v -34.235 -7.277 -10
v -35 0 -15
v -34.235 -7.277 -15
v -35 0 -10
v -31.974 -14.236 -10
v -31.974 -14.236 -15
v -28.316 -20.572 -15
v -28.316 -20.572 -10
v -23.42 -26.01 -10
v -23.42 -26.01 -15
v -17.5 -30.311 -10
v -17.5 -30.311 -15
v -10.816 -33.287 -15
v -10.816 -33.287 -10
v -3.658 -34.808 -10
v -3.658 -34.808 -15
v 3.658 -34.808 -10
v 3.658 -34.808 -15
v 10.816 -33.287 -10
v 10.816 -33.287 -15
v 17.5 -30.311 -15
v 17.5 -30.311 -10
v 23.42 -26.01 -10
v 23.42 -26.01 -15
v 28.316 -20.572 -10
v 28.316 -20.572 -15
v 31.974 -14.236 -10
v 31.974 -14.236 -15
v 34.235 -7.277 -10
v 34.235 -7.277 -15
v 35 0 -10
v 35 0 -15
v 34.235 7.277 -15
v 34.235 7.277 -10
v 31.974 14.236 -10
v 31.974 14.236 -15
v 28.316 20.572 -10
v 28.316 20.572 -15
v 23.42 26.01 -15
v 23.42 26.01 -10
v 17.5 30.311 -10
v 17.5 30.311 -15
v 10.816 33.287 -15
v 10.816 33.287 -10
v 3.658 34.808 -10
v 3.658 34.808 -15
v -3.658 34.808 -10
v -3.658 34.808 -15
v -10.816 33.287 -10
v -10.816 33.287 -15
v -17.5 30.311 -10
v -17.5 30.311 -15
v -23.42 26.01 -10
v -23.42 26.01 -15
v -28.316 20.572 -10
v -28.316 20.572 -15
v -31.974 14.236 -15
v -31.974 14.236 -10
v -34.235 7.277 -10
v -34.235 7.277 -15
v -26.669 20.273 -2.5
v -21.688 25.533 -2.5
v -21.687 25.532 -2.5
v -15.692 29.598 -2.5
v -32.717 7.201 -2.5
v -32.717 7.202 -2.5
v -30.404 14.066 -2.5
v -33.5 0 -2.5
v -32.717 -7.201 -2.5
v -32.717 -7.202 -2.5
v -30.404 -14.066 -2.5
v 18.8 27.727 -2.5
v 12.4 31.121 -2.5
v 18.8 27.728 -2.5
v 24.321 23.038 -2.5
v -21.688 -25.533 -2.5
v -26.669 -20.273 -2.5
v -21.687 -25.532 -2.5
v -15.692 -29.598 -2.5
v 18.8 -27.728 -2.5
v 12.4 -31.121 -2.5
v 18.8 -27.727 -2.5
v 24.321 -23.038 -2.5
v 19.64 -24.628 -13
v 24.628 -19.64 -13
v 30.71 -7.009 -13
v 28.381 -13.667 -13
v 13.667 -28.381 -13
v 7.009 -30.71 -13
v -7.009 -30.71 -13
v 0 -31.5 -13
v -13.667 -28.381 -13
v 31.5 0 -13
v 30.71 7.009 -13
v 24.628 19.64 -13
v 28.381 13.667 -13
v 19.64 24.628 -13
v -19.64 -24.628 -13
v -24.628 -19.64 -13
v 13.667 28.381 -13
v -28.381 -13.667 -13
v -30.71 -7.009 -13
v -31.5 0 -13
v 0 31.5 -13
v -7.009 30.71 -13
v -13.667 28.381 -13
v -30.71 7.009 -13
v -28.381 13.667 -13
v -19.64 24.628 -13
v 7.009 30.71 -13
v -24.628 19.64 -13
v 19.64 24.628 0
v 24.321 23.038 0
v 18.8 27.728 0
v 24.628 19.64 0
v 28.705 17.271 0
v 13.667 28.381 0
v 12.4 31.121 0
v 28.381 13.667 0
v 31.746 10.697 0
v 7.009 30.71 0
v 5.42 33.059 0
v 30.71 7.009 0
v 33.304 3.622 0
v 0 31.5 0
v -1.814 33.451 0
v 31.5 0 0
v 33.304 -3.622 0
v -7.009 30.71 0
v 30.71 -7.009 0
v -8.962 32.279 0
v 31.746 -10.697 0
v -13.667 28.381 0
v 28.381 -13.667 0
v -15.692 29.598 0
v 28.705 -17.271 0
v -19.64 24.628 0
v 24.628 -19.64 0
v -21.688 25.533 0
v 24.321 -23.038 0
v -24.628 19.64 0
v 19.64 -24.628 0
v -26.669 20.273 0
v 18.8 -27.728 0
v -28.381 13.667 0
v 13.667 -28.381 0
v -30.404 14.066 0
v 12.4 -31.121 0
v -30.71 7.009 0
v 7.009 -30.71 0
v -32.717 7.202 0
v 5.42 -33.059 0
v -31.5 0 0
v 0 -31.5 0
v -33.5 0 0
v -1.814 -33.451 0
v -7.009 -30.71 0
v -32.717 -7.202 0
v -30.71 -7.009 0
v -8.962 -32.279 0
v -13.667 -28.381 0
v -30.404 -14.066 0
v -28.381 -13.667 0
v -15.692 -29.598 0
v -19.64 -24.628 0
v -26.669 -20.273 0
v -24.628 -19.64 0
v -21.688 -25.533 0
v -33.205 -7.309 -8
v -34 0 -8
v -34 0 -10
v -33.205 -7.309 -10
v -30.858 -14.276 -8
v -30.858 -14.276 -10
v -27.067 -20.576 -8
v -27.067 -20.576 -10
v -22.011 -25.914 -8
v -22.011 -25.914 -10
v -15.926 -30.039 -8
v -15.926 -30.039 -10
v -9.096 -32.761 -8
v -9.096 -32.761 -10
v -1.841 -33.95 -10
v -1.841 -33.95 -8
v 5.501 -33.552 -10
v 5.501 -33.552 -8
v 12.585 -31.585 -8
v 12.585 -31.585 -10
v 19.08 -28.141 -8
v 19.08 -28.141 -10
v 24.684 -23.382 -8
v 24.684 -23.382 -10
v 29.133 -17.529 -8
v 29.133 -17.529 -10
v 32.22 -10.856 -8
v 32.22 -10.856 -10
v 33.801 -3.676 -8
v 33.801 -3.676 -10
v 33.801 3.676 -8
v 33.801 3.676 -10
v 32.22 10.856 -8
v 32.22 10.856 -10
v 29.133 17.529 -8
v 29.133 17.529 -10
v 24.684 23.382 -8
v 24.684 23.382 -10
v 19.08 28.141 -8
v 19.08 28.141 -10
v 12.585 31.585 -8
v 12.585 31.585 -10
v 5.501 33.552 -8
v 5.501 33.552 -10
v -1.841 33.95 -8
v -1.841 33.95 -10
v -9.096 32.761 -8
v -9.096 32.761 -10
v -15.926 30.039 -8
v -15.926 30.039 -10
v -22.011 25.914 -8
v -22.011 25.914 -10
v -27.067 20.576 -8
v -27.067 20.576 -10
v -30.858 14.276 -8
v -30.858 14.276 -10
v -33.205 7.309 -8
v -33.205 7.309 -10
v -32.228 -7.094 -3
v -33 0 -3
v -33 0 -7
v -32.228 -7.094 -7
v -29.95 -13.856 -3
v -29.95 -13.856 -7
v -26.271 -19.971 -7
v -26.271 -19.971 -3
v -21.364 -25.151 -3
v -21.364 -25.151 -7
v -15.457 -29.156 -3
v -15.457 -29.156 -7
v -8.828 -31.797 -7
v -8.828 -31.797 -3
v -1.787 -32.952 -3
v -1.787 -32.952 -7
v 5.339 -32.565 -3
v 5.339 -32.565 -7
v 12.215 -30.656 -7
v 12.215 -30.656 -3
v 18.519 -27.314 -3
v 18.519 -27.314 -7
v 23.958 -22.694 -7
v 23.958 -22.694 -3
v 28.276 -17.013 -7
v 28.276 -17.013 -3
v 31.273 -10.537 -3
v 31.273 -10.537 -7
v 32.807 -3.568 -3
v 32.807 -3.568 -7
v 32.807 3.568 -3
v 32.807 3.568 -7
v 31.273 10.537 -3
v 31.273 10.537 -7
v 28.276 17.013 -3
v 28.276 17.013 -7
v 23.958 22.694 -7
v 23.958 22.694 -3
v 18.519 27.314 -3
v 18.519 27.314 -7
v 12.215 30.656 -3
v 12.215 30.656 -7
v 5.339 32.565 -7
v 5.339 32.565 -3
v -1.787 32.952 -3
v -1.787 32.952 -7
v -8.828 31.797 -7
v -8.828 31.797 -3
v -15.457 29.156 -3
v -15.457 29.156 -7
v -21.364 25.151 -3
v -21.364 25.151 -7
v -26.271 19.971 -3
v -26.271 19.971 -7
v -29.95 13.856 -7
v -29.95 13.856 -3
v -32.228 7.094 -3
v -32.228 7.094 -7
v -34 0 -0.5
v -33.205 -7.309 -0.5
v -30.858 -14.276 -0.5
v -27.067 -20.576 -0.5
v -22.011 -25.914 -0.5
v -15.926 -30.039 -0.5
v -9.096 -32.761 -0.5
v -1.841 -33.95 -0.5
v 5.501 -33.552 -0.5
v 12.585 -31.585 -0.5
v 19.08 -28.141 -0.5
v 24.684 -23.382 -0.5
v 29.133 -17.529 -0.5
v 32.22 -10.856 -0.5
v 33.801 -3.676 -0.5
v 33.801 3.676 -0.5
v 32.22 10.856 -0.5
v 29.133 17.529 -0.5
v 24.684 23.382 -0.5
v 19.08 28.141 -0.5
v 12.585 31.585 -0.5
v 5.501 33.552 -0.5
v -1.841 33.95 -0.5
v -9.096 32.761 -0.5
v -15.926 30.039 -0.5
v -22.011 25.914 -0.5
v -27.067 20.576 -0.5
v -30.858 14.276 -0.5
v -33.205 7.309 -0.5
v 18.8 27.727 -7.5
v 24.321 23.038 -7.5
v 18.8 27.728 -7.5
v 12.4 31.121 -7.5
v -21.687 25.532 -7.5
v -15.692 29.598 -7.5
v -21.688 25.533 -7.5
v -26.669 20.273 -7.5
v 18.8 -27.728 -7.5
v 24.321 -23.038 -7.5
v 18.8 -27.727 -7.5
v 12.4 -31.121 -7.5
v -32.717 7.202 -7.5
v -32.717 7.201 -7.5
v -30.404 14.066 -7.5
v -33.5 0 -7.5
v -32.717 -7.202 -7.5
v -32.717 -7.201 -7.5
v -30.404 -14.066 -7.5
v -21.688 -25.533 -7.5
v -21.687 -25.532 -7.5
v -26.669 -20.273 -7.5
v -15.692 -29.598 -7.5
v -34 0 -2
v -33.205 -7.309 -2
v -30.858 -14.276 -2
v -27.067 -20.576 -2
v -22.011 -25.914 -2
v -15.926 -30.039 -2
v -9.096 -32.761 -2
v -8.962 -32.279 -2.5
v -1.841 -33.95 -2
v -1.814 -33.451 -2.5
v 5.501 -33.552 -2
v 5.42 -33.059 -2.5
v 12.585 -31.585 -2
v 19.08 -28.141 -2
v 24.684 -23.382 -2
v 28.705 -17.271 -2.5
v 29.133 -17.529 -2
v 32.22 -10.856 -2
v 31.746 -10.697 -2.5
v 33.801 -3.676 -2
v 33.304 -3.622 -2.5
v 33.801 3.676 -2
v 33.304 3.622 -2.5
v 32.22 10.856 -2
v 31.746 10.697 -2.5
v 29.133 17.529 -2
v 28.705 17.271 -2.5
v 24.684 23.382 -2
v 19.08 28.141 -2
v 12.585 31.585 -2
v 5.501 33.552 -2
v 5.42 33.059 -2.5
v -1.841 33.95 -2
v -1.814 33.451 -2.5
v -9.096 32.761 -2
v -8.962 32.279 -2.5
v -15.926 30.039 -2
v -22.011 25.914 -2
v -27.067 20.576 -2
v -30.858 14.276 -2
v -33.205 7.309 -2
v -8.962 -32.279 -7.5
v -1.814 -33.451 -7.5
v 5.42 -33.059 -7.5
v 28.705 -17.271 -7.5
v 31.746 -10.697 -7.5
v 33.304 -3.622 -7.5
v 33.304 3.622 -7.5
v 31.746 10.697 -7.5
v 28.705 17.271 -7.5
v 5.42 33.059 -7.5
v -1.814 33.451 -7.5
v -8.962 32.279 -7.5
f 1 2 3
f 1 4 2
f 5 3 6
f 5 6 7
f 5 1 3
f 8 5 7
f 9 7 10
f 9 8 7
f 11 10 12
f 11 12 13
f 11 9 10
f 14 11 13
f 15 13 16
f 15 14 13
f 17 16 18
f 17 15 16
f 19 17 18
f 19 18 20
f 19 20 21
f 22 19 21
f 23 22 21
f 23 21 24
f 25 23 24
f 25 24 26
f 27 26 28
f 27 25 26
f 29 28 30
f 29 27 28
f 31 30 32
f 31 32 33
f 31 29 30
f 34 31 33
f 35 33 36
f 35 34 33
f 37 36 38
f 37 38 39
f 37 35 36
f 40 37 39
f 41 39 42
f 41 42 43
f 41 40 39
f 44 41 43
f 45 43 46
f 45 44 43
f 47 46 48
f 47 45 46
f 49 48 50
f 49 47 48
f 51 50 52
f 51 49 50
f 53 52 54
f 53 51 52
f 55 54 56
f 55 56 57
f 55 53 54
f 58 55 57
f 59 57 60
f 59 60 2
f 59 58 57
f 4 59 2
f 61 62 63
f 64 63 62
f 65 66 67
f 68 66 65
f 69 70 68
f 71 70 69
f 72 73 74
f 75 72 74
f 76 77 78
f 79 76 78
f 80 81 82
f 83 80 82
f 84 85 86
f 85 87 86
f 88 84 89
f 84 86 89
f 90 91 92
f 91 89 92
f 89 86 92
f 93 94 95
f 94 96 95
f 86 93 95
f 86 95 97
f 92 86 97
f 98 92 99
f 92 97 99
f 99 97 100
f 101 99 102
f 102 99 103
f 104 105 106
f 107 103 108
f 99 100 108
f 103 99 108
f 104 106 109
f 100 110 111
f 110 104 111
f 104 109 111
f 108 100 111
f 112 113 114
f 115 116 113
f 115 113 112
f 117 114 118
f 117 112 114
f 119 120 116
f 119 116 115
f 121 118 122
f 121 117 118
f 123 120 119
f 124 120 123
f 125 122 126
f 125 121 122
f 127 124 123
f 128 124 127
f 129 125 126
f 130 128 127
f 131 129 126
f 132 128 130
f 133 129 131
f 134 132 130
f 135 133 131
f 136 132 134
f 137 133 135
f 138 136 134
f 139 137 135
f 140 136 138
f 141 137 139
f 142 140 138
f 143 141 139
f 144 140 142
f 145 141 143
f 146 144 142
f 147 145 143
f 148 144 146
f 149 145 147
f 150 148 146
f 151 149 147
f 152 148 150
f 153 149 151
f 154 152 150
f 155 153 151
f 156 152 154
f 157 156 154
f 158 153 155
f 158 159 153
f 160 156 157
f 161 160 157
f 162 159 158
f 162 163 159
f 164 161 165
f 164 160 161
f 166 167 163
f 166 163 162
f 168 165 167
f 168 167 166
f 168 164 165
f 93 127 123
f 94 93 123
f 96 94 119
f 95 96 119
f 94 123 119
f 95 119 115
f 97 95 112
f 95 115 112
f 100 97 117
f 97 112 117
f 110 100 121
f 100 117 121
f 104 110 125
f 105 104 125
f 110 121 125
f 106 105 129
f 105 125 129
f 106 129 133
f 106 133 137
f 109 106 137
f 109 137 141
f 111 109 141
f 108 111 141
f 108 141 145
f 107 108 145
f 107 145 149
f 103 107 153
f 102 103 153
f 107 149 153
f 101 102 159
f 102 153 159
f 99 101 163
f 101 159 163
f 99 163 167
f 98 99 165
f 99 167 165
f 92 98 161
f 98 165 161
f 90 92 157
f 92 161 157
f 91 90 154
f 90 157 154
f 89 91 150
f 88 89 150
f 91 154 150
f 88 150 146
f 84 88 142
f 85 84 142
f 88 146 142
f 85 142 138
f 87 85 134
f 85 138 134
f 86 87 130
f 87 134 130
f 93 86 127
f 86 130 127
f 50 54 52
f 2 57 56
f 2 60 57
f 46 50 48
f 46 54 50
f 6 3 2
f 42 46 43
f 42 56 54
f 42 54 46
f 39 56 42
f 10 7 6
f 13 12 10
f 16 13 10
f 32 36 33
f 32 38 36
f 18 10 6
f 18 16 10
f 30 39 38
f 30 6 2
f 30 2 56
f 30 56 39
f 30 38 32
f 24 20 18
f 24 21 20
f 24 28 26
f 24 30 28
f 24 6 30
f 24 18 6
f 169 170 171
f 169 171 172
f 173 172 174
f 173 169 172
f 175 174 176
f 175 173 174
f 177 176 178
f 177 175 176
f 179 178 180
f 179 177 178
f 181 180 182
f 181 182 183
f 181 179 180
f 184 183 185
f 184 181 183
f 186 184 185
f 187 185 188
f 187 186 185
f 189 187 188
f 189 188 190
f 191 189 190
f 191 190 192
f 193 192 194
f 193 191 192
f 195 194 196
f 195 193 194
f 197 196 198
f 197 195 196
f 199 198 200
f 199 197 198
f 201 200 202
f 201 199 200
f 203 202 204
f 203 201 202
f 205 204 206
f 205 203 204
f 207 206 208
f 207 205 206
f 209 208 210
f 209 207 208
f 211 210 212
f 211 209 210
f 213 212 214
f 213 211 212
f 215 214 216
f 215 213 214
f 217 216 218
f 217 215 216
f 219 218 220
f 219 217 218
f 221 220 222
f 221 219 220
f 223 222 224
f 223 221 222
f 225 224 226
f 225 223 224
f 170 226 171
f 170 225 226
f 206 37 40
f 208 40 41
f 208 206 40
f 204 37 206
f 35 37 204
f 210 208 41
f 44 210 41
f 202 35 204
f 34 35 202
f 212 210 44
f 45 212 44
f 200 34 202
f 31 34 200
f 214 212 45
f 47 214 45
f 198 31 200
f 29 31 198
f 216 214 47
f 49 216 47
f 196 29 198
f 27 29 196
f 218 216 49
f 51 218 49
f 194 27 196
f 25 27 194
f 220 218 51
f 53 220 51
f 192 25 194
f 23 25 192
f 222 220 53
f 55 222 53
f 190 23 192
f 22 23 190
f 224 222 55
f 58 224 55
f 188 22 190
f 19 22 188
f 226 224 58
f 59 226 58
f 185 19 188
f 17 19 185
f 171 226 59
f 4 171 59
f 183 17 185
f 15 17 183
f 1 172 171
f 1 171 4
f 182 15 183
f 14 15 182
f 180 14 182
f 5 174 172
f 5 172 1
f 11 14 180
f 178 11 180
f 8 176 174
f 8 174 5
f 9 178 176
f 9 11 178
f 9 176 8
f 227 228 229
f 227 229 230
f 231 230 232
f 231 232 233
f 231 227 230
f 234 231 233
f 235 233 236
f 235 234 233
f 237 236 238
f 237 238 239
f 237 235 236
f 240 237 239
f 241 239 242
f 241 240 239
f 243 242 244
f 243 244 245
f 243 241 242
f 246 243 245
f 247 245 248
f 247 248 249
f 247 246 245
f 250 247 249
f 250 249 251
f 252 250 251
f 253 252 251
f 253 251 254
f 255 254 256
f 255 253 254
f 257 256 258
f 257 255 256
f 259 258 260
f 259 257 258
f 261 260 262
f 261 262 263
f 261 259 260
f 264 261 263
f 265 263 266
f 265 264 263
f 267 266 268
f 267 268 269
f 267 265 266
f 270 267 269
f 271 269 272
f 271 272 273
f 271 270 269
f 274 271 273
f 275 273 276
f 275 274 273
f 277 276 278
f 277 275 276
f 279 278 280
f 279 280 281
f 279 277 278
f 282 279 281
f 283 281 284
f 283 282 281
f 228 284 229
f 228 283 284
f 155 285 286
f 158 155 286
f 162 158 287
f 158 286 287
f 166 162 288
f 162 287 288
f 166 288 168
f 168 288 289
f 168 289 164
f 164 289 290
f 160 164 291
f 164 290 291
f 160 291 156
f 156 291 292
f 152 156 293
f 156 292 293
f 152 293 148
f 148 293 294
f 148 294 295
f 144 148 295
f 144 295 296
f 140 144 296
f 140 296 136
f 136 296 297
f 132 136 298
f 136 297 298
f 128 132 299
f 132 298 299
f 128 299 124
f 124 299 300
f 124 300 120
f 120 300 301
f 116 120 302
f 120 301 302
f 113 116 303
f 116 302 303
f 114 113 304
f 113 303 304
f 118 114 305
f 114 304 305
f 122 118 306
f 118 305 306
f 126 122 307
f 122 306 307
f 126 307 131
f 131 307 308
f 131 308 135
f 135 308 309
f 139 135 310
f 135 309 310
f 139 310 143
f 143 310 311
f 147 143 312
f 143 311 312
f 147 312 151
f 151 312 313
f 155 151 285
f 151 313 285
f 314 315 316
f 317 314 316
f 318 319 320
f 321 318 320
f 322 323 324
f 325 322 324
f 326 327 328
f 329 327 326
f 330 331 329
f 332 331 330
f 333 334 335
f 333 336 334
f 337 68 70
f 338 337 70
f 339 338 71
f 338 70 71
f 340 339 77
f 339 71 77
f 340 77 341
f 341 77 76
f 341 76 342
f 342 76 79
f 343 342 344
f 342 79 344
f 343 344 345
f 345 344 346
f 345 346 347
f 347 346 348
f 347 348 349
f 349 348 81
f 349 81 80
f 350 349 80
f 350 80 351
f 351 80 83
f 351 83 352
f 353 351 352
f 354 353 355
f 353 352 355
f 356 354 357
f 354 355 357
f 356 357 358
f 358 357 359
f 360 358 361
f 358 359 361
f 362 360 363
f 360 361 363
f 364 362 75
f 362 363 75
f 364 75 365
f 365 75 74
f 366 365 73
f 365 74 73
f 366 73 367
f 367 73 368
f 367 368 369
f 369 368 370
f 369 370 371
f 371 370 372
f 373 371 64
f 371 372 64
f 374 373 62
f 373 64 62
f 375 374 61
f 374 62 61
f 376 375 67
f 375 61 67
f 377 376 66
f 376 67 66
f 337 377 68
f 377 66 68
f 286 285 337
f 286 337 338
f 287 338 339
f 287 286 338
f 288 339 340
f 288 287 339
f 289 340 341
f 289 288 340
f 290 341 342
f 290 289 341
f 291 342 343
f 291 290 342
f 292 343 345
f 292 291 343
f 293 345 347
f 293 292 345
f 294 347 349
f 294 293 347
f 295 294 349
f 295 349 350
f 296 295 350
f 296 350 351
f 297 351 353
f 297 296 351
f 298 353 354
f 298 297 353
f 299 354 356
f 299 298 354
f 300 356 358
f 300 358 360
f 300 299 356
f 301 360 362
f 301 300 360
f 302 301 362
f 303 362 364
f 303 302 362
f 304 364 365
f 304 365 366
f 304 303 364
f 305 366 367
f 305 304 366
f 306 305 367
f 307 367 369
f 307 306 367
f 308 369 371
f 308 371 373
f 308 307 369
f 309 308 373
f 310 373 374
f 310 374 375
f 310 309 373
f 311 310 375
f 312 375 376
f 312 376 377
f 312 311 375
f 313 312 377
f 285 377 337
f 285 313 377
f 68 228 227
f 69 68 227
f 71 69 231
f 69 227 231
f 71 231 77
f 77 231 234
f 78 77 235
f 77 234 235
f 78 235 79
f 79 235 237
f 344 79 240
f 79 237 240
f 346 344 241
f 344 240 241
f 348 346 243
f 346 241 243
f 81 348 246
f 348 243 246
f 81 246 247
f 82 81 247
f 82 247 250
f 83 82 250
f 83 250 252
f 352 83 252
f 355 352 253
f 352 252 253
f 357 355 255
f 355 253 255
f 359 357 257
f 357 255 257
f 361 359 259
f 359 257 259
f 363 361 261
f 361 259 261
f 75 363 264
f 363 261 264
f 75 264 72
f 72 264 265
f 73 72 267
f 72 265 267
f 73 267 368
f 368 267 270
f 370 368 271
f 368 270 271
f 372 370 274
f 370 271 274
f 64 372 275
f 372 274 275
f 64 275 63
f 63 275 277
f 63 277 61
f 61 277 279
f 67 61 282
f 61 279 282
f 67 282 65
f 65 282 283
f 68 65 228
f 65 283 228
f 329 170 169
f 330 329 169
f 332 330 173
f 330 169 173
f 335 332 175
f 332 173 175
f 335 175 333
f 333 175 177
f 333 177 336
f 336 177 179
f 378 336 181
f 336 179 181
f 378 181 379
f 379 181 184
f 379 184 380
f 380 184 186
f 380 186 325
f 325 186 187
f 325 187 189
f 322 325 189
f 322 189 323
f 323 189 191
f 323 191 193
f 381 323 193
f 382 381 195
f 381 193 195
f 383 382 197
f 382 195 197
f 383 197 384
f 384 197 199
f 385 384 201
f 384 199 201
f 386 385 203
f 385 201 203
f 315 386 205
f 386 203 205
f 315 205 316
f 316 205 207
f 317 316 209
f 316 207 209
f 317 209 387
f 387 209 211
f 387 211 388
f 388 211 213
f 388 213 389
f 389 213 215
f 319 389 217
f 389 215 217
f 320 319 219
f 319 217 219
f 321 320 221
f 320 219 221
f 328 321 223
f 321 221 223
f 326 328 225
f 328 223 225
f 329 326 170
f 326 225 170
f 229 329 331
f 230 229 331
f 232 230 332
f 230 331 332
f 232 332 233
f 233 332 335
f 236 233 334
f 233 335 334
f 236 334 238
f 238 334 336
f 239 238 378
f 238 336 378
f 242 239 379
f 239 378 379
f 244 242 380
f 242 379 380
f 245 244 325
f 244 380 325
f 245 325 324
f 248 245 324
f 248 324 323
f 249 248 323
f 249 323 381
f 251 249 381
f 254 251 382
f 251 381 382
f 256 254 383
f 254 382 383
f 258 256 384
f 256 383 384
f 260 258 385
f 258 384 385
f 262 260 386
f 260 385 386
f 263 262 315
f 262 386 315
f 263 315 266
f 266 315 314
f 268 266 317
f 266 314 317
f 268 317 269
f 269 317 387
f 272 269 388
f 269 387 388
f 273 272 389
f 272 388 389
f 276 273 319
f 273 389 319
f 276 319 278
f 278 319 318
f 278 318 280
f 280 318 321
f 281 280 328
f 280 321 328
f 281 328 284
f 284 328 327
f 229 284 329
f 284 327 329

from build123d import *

# Parameters (mm, degrees)
CHAMFER1_SIZE           = 0.5
CHAMFER2_SIZE           = 0.5
BOSS_EXTRUDE1_START     = -2
SKETCH3_R               = 28.025
BOSS_EXTRUDE1_DEPTH     = 2
CUT_EXTRUDE1_DEPTH      = 54.38539126
CUT_EXTRUDE1_DEPTH_BACK = 54.38539126
SKETCH4_W               = 71.155629785
SKETCH4_H               = 10.339888571
SKETCH5_R               = 31.5
CUT_EXTRUDE2_DEPTH      = 13


with BuildPart() as part:
    # Sketch1 → Revolve1 (revolve)
    with BuildSketch(Plane(origin=(0, 0, 0), x_dir=(1, 0, 0), z_dir=(0, 1, 0)), mode=Mode.PRIVATE) as revolve1_sk:
        Polygon((25.025, 0), (25.025, 20), (28.025, 20), (28.025, 15), (35, 15), (35, 10), (34, 10), (34, 7.5), (33, 7.5), (33, 2.5), (34, 2.5), (34, 0), align=None)
    revolve(revolve1_sk.sketch.rotate(Axis((0, 0, -99.297916667), (0, 0, 1)), 180), axis=Axis((0, 0, -99.297916667), (0, 0, 1)))

    # Chamfer1
    chamfer1_edges = [part.edges().sort_by_distance(p)[0] for p in [
        (28.025, 0, -20),
        (25.025, 0, -20),
    ]]
    chamfer(chamfer1_edges, length=CHAMFER1_SIZE)

    # Chamfer2
    chamfer2_edges = [part.edges().sort_by_distance(p)[0] for p in [
        (34, 0, -7.5),
        (34, 0, 0),
        (34, 0, -2.5),
        (33, 0, -2.5),
        (33, 0, -7.5),
    ]]
    chamfer(chamfer2_edges, length=CHAMFER2_SIZE - 0.0001)  # a hair under: the kernel refuses the full size

    # Sketch3 → Boss-Extrude1 (add)
    with BuildSketch(Plane(origin=(0, 0, -15), x_dir=(-1, 0, 0), z_dir=(0, 0, -1)).offset(BOSS_EXTRUDE1_START)):
        Circle(SKETCH3_R)
    extrude(amount=BOSS_EXTRUDE1_DEPTH)

    # Sketch4 → Cut-Extrude1 (cut, two sides: drawn at the far end of the back side and taken through both)
    with BuildSketch(Plane(origin=(0, 0, 0), x_dir=(1, 0, 0), z_dir=(0, 1, 0)).offset(-CUT_EXTRUDE1_DEPTH_BACK)):
        with Locations((0.577814893, 20.169944286)):
            Rectangle(SKETCH4_W, SKETCH4_H)
    extrude(amount=CUT_EXTRUDE1_DEPTH + CUT_EXTRUDE1_DEPTH_BACK, mode=Mode.SUBTRACT)

    # Sketch5 → Cut-Extrude2 (cut)
    with BuildSketch(Plane.XY):
        Circle(SKETCH5_R)
    extrude(amount=-CUT_EXTRUDE2_DEPTH, mode=Mode.SUBTRACT)


solid = part.part
